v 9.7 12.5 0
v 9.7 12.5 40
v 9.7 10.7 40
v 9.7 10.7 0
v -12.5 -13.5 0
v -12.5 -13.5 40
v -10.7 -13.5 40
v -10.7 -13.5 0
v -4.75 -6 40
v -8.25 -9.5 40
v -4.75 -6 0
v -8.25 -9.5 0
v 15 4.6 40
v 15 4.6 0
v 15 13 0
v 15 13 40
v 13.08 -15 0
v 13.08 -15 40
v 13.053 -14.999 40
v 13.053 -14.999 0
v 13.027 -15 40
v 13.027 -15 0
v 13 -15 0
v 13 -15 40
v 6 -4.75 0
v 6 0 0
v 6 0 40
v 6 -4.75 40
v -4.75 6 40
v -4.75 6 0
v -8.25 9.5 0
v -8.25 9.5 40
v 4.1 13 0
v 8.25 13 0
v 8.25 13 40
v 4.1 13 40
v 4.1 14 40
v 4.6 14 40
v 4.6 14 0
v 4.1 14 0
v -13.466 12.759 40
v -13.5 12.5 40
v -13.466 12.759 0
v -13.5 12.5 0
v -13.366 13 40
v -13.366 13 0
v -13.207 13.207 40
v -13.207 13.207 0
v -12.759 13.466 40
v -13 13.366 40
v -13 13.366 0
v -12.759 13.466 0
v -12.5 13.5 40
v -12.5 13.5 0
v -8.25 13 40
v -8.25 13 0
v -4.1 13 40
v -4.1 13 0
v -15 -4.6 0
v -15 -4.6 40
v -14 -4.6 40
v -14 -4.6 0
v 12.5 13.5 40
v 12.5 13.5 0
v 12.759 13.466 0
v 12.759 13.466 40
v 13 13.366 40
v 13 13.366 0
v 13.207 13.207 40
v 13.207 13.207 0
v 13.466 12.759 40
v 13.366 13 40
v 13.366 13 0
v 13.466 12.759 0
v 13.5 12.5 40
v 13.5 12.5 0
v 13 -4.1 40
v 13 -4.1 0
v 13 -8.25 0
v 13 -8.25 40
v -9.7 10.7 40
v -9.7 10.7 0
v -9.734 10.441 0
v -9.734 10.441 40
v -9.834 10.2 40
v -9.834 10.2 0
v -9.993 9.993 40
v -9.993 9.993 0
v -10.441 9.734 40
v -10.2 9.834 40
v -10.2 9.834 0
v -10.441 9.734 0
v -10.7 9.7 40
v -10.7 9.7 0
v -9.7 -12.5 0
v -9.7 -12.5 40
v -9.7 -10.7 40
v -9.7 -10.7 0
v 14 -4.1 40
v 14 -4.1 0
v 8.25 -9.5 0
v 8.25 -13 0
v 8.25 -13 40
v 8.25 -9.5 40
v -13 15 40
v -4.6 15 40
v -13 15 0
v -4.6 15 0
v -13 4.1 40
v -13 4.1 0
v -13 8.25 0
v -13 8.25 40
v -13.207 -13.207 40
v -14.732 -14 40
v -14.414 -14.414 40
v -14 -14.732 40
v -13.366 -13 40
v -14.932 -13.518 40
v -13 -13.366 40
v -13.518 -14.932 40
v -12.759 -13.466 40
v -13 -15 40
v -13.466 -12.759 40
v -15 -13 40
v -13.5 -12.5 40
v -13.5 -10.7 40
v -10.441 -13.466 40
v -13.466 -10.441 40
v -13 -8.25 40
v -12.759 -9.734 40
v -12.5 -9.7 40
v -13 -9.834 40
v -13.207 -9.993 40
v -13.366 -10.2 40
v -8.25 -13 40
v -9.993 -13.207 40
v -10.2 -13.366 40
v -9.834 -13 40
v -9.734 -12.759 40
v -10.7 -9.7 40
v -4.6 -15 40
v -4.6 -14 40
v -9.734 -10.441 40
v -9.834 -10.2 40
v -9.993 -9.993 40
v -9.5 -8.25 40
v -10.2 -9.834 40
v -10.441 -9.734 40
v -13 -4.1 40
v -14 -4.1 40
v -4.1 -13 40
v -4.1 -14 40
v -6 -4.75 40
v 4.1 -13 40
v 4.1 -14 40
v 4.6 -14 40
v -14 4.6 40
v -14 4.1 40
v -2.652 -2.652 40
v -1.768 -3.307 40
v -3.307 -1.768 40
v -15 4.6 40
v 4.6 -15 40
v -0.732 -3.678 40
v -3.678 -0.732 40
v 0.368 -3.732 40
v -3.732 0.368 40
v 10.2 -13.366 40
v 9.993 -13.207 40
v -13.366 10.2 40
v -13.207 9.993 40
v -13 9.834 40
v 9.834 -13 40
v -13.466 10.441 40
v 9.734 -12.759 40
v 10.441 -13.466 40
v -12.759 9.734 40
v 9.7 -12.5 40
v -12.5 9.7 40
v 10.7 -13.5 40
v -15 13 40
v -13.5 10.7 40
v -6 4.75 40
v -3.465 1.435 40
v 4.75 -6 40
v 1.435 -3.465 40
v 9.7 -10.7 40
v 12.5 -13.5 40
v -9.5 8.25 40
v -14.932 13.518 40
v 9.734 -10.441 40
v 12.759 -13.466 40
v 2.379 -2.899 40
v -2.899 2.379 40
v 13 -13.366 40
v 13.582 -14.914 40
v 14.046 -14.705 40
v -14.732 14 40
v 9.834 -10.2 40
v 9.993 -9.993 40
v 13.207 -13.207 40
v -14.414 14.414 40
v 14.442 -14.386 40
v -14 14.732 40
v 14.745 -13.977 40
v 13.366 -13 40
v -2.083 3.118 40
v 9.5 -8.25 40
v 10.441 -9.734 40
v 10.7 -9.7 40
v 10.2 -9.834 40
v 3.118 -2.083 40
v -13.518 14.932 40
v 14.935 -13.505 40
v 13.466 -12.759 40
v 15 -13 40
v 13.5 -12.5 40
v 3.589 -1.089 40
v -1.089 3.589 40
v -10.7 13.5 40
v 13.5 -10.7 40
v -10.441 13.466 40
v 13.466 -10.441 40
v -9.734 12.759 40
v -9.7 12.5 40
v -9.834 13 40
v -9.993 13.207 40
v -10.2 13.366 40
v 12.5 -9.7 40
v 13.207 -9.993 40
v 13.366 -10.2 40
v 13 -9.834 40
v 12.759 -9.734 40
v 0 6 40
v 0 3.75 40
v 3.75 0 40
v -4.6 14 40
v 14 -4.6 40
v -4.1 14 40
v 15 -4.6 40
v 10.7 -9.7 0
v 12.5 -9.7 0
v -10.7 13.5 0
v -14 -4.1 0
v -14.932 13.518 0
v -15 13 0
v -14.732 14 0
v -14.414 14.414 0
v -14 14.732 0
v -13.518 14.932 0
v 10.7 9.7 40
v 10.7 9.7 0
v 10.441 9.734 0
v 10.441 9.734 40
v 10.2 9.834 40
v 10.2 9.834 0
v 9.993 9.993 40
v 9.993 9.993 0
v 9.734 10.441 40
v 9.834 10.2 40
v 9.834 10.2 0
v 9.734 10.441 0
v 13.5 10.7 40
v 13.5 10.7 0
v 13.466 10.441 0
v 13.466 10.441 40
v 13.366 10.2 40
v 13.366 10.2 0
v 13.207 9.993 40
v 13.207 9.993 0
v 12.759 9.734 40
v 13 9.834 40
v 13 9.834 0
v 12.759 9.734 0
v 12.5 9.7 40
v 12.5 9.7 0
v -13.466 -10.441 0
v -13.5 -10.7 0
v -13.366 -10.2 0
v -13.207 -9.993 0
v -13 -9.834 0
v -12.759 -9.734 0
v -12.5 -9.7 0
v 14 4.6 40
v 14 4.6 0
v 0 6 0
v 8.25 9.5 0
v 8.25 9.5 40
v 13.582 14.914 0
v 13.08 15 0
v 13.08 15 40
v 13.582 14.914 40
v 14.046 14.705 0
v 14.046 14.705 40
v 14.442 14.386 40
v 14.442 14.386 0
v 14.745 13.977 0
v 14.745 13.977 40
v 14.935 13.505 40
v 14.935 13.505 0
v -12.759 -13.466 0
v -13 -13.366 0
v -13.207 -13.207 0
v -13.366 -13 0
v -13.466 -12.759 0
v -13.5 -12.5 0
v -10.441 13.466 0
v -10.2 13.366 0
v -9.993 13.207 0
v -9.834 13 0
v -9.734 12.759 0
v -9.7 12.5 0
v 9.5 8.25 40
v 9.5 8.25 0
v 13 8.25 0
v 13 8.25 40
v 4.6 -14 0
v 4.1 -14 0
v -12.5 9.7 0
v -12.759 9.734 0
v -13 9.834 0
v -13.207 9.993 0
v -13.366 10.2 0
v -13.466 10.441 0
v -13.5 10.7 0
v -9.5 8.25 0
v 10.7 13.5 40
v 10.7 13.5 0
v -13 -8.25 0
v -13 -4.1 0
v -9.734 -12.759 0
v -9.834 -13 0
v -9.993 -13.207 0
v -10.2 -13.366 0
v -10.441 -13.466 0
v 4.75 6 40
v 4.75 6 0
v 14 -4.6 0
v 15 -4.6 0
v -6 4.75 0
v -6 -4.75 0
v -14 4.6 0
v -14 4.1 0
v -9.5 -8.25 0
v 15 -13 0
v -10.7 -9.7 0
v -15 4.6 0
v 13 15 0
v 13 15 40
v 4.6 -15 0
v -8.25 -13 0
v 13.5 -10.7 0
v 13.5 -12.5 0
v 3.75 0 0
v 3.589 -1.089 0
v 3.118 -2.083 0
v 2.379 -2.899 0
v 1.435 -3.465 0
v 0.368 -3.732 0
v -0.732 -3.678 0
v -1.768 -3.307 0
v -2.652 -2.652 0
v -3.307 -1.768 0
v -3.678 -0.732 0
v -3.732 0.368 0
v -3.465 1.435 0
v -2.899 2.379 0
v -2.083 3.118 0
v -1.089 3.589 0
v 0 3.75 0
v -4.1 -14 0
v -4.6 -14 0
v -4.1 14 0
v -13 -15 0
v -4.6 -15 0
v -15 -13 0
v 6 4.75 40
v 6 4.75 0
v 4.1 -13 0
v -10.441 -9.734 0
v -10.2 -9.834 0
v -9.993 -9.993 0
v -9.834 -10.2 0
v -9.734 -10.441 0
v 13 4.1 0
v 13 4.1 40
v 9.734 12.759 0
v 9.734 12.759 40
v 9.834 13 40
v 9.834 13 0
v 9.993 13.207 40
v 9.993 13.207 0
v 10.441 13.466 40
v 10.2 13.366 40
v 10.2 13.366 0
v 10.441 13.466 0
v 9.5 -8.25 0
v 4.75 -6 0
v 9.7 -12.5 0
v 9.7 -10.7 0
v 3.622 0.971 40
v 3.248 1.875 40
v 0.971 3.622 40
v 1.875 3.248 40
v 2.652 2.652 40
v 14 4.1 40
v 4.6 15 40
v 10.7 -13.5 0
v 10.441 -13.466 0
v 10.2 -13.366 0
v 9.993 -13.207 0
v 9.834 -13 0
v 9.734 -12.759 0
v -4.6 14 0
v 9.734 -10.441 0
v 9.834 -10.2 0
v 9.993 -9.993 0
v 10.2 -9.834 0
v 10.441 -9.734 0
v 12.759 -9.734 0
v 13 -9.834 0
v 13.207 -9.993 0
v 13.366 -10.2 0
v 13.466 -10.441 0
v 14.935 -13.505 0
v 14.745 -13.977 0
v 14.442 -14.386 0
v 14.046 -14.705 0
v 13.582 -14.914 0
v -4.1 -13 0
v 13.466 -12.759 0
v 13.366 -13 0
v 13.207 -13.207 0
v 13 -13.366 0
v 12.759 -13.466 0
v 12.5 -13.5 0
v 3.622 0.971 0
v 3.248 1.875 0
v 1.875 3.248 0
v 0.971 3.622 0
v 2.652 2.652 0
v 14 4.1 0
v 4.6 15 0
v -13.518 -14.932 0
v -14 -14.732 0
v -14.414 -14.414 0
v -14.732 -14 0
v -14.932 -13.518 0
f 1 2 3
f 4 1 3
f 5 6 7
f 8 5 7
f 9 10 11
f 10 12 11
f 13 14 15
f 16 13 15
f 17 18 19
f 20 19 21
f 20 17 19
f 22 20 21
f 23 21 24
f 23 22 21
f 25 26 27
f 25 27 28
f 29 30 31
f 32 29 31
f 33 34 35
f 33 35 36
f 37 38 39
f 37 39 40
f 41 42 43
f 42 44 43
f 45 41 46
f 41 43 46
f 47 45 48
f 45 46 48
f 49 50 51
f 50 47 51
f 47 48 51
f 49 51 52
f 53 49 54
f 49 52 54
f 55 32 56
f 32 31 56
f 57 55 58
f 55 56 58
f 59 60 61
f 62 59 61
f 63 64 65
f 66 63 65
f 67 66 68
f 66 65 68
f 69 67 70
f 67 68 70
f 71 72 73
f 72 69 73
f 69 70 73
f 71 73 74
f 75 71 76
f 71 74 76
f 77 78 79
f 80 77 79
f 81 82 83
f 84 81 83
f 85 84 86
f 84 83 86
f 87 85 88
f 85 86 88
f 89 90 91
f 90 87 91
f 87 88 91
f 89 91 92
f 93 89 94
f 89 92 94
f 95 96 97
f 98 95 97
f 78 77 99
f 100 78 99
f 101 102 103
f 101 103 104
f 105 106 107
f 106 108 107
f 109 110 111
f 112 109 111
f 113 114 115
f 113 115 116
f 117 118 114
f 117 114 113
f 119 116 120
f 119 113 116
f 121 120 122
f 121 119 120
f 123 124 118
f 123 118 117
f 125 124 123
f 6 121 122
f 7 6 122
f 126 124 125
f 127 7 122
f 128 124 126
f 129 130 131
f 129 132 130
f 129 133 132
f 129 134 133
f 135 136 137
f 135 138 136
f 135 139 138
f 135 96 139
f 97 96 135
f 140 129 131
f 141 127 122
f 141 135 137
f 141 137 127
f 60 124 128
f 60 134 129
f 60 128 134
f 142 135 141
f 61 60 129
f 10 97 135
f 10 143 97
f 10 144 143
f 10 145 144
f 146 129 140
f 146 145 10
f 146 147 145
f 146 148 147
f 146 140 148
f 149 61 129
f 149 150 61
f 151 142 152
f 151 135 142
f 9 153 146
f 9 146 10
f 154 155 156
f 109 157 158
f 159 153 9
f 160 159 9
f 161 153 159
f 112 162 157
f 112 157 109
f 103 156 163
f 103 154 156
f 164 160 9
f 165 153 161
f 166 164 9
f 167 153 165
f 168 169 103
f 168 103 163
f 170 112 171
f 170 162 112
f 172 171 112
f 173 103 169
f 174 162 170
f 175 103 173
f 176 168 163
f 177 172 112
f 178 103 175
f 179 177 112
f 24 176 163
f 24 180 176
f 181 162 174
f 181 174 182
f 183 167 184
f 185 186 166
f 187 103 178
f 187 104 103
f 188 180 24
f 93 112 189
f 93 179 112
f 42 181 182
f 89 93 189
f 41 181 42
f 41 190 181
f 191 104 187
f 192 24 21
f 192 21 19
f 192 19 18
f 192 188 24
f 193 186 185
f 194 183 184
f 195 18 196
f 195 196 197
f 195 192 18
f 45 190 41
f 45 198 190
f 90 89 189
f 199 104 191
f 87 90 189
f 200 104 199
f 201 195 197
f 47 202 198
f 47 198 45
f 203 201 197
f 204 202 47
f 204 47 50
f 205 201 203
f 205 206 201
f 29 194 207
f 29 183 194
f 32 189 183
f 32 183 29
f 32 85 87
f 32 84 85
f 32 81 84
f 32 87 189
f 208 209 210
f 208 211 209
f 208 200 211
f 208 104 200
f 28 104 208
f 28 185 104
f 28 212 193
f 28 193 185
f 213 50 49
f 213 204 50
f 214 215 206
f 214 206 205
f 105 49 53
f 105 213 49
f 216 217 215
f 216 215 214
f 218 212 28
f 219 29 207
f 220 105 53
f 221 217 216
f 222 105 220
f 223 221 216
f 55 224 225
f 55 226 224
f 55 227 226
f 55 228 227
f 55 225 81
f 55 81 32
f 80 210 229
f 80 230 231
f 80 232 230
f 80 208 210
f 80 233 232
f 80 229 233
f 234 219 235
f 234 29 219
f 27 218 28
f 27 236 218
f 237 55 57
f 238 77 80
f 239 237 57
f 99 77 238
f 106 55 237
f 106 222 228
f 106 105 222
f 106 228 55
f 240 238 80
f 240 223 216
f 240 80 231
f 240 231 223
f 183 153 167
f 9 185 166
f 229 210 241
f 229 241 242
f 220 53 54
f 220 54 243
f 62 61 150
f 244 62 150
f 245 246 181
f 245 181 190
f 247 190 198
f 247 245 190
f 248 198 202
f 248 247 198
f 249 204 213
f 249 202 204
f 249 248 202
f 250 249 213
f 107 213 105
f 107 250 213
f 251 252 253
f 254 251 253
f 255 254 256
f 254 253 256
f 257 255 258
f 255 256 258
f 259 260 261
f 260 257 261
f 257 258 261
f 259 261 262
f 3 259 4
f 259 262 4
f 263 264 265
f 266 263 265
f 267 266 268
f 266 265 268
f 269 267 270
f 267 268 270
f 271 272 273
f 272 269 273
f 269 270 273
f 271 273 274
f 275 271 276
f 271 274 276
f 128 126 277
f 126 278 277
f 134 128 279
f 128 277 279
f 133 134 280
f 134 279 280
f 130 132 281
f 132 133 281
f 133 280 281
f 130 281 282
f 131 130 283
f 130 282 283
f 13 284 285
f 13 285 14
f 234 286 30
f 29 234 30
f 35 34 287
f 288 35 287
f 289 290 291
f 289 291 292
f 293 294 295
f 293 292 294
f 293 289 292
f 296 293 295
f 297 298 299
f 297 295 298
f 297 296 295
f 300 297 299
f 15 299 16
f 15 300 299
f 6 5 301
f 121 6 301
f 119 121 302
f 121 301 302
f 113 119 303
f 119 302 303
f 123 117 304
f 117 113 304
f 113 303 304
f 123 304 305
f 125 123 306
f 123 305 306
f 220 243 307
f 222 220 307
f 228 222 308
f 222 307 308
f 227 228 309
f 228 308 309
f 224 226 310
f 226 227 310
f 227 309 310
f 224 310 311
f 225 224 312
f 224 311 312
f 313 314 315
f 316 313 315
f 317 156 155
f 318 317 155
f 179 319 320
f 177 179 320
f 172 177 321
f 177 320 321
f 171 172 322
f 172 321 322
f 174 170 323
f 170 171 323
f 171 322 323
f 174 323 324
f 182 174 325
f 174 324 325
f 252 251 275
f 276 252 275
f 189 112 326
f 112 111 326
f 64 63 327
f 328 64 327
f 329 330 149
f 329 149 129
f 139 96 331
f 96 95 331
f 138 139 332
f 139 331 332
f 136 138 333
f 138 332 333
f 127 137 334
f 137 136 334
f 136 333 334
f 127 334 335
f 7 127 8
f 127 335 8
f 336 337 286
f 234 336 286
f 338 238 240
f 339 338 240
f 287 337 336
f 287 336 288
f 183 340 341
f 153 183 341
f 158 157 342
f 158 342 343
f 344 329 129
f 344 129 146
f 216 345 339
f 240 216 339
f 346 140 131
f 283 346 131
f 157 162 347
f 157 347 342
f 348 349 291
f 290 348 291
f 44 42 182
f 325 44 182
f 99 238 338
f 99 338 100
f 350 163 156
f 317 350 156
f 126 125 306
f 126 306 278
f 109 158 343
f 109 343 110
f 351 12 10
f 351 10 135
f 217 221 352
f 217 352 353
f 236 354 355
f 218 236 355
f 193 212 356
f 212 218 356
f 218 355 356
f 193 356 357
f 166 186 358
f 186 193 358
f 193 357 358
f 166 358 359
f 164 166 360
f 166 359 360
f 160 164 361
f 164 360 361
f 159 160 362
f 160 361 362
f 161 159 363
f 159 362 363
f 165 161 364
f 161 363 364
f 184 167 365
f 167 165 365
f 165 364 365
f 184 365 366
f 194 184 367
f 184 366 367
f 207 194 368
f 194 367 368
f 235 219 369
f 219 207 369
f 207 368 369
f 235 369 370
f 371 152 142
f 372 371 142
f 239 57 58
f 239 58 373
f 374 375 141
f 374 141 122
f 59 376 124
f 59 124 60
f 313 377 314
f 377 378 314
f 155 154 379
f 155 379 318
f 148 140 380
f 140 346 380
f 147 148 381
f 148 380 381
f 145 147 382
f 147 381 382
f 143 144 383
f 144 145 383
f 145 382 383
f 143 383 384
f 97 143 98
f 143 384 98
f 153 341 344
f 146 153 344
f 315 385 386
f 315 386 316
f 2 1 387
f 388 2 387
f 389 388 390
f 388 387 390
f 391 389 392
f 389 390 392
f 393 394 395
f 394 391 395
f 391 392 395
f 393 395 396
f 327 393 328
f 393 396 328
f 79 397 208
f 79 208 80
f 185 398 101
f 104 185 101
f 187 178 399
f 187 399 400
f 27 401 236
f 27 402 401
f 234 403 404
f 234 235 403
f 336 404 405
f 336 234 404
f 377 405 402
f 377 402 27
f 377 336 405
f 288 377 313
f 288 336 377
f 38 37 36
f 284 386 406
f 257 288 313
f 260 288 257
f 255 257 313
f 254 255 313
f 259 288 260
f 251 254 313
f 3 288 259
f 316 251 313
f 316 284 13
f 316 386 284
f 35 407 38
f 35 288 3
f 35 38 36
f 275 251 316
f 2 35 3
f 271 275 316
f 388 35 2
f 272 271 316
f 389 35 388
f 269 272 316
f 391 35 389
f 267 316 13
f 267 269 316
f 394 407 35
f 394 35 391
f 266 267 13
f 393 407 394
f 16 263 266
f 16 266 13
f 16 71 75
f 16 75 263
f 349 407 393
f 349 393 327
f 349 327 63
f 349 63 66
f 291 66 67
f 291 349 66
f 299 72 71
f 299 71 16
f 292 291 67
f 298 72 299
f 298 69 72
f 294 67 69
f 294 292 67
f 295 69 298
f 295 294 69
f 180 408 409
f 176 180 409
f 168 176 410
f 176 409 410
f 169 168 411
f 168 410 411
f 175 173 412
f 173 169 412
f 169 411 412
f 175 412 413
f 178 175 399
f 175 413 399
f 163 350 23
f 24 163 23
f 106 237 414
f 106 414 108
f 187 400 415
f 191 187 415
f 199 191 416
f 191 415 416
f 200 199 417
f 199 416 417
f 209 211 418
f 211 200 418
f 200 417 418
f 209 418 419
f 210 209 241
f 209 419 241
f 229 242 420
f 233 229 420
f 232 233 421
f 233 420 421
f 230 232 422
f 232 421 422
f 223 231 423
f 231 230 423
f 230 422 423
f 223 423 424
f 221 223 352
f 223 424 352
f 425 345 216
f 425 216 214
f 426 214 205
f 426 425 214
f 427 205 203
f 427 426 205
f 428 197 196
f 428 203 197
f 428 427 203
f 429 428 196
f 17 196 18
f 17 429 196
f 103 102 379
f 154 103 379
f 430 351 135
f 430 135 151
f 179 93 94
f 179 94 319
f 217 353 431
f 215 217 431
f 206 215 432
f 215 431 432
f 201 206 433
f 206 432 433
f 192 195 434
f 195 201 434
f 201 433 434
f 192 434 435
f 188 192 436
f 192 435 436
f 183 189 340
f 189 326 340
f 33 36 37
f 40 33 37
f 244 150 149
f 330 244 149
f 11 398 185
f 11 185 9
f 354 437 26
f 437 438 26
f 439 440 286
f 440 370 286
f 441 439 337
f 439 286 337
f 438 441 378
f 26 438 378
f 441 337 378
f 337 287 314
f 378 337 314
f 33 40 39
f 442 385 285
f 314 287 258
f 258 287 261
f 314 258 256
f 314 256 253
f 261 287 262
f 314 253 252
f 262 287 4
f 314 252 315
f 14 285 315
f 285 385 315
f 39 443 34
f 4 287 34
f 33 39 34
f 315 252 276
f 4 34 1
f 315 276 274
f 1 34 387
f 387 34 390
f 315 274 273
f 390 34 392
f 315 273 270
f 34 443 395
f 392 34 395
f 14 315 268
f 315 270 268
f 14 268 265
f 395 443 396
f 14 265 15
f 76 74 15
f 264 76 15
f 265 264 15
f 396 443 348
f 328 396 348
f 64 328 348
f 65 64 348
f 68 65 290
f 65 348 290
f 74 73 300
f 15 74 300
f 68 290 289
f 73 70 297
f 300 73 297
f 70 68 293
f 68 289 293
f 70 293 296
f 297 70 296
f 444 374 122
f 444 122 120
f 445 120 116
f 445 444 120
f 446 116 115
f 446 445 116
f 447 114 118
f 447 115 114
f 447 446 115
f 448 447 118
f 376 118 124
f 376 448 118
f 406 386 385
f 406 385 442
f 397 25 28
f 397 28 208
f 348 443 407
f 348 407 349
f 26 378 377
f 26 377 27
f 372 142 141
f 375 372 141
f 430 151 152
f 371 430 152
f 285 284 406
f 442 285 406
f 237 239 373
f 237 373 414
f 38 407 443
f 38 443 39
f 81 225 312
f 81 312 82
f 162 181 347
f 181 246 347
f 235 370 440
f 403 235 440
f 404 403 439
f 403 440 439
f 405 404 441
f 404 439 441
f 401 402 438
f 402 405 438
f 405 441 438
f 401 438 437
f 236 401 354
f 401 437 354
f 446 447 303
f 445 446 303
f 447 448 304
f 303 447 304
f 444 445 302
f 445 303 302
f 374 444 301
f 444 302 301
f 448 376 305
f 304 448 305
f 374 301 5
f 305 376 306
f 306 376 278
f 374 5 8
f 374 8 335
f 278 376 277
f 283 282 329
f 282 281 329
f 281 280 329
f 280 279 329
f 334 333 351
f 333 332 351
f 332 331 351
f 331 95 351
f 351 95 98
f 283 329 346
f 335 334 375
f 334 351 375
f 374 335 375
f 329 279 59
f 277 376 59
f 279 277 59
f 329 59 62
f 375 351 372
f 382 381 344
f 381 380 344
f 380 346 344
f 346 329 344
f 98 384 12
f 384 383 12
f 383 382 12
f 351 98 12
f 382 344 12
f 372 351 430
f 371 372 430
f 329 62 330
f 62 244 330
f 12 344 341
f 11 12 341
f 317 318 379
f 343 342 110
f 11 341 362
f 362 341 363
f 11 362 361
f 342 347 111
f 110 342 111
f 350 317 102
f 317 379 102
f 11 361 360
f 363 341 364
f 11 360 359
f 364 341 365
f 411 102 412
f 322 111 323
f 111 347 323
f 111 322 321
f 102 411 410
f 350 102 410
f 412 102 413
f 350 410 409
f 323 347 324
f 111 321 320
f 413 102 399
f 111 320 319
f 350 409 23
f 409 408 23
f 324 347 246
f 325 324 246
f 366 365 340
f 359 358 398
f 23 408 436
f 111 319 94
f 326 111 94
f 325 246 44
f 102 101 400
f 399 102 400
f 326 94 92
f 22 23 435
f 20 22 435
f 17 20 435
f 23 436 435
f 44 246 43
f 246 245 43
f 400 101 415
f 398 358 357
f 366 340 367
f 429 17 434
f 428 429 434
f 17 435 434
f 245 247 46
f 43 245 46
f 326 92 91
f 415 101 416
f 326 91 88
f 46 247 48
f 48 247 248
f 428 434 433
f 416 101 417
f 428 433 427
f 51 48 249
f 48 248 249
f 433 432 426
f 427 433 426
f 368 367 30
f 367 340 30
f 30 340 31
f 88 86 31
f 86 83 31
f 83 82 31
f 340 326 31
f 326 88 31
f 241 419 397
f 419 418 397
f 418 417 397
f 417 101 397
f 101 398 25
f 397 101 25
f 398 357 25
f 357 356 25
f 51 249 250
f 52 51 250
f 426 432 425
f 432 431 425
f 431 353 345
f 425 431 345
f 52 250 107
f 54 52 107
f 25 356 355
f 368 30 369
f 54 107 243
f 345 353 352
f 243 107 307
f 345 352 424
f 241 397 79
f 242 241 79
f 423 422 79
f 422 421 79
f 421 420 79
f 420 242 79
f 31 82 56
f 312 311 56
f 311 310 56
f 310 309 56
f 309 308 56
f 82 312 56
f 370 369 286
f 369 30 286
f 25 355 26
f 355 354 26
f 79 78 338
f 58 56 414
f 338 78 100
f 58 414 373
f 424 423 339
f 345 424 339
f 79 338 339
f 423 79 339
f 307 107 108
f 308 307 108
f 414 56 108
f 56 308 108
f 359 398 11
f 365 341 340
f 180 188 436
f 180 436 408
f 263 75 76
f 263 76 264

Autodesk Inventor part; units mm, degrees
ref_plane "YZ Plane" through (0, 0, 0) normal (1, 0, 0) x (0, 1, 0)
ref_plane "XZ Plane" through (0, 0, 0) normal (0, 1, 0) x (-1, 0, 0)
ref_plane "XY Plane" through (0, 0, 0) normal (0, 0, 1) x (1, 0, 0)
sketch "Sketch1" plane through (0, 0, 0) normal (0, 0, 1) x (1, 0, 0)
  line L0 (-4.1, 13) -> (-4.1, 14)
  line L1 (-4.1, 14) -> (-4.6, 14)
  line L2 (-4.6, 14) -> (-4.6, 15)
  line L3 (-4.6, 14) -> (-4.6, 15)
  line L4 (-4.6, 15) -> (-13, 15)
  arc A0 (-13, 15) -> (-15, 13) centre (-13, 13) ccw
  line L5 (-15, 13) -> (-15, 4.6)
  line L6 (-15, 13) -> (-15, 4.6)
  line L7 (-15, 4.6) -> (-14, 4.6)
  line L8 (-15, 4.6) -> (-14, 4.6)
  line L9 (-14, 4.6) -> (-14, 4.1)
  line L10 (-14, 4.6) -> (-14, 4.1)
  line L11 (-14, 4.1) -> (-13, 4.1)
  line L12 (-13, 4.1) -> (-13, 8.25)
  line L13 (-13, 8.25) -> (-9.5, 8.25)
  line L14 (-13, 8.25) -> (-9.5, 8.25)
  line L15 (-9.5, 8.25) -> (-6, 4.75)
  line L16 (-6, 4.75) -> (-6, -4.75)
  line L17 (-6, 4.75) -> (-6, -4.75)
  line L18 (-6, -4.75) -> (-9.5, -8.25)
  line L19 (-14, -4.1) -> (-13, -4.1)
  line L20 (-13, -4.1) -> (-14, -4.1)
  line L21 (-14, -4.6) -> (-14, -4.1)
  line L22 (-14, -4.1) -> (-14, -4.6)
  line L23 (-15, -4.6) -> (-14, -4.6)
  line L24 (-14, -4.6) -> (-15, -4.6)
  line L25 (-8.25, 13) -> (-4.1, 13)
  line L26 (-4.1, 13) -> (-8.25, 13)
  line L27 (-8.25, 9.5) -> (-8.25, 13)
  line L28 (-8.25, 13) -> (-8.25, 9.5)
  line L29 (-4.75, 6) -> (-8.25, 9.5)
  line L30 (-8.25, 9.5) -> (-4.75, 6)
  line L31 (4.75, 6) -> (-4.75, 6)
  line L32 (-4.75, 6) -> (4.75, 6)
  line L33 (4.75, 6) -> (8.25, 9.5)
  line L34 (8.25, 13) -> (8.25, 9.5)
  line L35 (8.25, 9.5) -> (8.25, 13)
  line L36 (8.25, 13) -> (4.1, 13)
  line L37 (4.1, 13) -> (4.1, 14)
  line L38 (4.6, 14) -> (4.1, 14)
  line L39 (4.1, 14) -> (4.6, 14)
  line L40 (4.6, 15) -> (4.6, 14)
  line L41 (4.6, 14) -> (4.6, 15)
  line L42 (4.6, 15) -> (13.08, 15)
  line L43 (15, 4.6) -> (15, 13)
  line L44 (15, 13) -> (15, 4.6)
  line L45 (14, 4.6) -> (15, 4.6)
  line L46 (15, 4.6) -> (14, 4.6)
  line L47 (14, 4.6) -> (14, 4.1)
  line L48 (13, 4.1) -> (14, 4.1)
  line L49 (14, 4.1) -> (13, 4.1)
  line L50 (13, 4.1) -> (13, 8.25)
  line L51 (9.5, 8.25) -> (13, 8.25)
  line L52 (13, 8.25) -> (9.5, 8.25)
  line L53 (6, 4.75) -> (9.5, 8.25)
  line L54 (9.5, 8.25) -> (6, 4.75)
  line L55 (6, 4.75) -> (6, -4.75)
  circle A1 centre (0, 0) radius 3.75
  line L56 (0, 0) -> (7.2487, 0)
  arc A2 (15, 13) -> (13, 15) centre (13, 13) ccw
  arc A3 (15, 13) -> (13.08, 15) centre (12.9977, 12.9994) ccw
  line L57 (-9.5, -8.25) -> (-6, -4.75)
  line L58 (-8.25, -9.5) -> (-4.75, -6)
  line L59 (-4.75, -6) -> (-8.25, -9.5)
  line L60 (-4.1, -13) -> (-4.1, -14)
  line L61 (-4.1, -14) -> (-4.6, -14)
  line L62 (-8.25, -13) -> (-4.1, -13)
  line L63 (-4.1, -13) -> (-8.25, -13)
  line L64 (-8.25, -9.5) -> (-8.25, -13)
  line L65 (-8.25, -13) -> (-8.25, -9.5)
  line L66 (-13, -8.25) -> (-9.5, -8.25)
  line L67 (-13, -4.1) -> (-13, -8.25)
  line L68 (-4.6, -14) -> (-4.6, -15)
  line L69 (-4.6, -14) -> (-4.6, -15)
  line L70 (-4.6, -15) -> (-13, -15)
  line L71 (-14, -4.6) -> (-14, -4.1)
  line L72 (-14, -4.6) -> (-14, -4.1)
  line L73 (-14, -4.1) -> (-13, -4.1)
  line L74 (-15, -4.6) -> (-14, -4.6)
  line L75 (-15, -4.6) -> (-14, -4.6)
  line L76 (-15, -13) -> (-15, -4.6)
  line L77 (-15, -13) -> (-15, -4.6)
  arc A4 (-15, -13) -> (-13, -15) centre (-13, -13) ccw
  line L78 (-13, -8.25) -> (-9.5, -8.25)
  line L79 (8.25, -13) -> (8.25, -9.5)
  line L80 (8.25, -9.5) -> (8.25, -13)
  line L81 (9.5, -8.25) -> (13, -8.25)
  line L82 (13, -8.25) -> (9.5, -8.25)
  line L83 (15, -13) -> (15, -4.6)
  line L84 (15, -4.6) -> (15, -13)
  line L85 (13, -4.1) -> (13, -8.25)
  line L86 (13, -4.1) -> (14, -4.1)
  line L87 (14, -4.1) -> (13, -4.1)
  line L88 (14, -4.6) -> (14, -4.1)
  line L89 (14, -4.6) -> (15, -4.6)
  line L90 (15, -4.6) -> (14, -4.6)
  line L91 (4.75, -6) -> (8.25, -9.5)
  line L92 (6, -4.75) -> (9.5, -8.25)
  line L93 (9.5, -8.25) -> (6, -4.75)
  arc A5 (13, -15) -> (15, -13) centre (13, -13) ccw
  arc A6 (13.08, -15) -> (15, -13) centre (12.9977, -12.9994) ccw
  line L94 (8.25, -13) -> (4.1, -13)
  line L95 (4.1, -13) -> (4.1, -14)
  line L96 (4.6, -14) -> (4.1, -14)
  line L97 (4.1, -14) -> (4.6, -14)
  line L98 (4.6, -15) -> (4.6, -14)
  line L99 (4.6, -14) -> (4.6, -15)
  line L100 (4.6, -15) -> (13.08, -15)
  line L101 (4.75, -6) -> (-4.75, -6)
  line L102 (-4.75, -6) -> (4.75, -6)
  circle A7 centre (0, 0) radius 3.75
  line L103 (-12.5, 13.5) -> (-10.7, 13.5)
  line L104 (-12.5, 13.5) -> (-10.7, 13.5)
  line L105 (-9.7, 12.5) -> (-9.7, 10.7)
  line L106 (-9.7, 12.5) -> (-9.7, 10.7)
  line L107 (-10.7, 9.7) -> (-12.5, 9.7)
  line L108 (-10.7, 9.7) -> (-12.5, 9.7)
  line L109 (-13.5, 12.5) -> (-13.5, 10.7)
  line L110 (-13.5, 10.7) -> (-13.5, 12.5)
  line L111 (-13.5, 12.5) -> (-13.5, 10.7)
  arc A8 (-12.5, 13.5) -> (-13.5, 12.5) centre (-12.5, 12.5) ccw
  arc A9 (-13.5, 10.7) -> (-12.5, 9.7) centre (-12.5, 10.7) ccw
  arc A10 (-13.5, 10.7) -> (-12.5, 9.7) centre (-12.5, 10.7) ccw
  arc A11 (-10.7, 9.7) -> (-9.7, 10.7) centre (-10.7, 10.7) ccw
  arc A12 (-9.7, 12.5) -> (-10.7, 13.5) centre (-10.7, 12.5) ccw
  arc A13 (-9.7, 12.5) -> (-10.7, 13.5) centre (-10.7, 12.5) ccw
  line L112 (0, 0) -> (0, 6.5)
  arc A14 (9.7, 10.7) -> (10.7, 9.7) centre (10.7, 10.7) ccw
  line L113 (9.7, 12.5) -> (9.7, 10.7)
  arc A15 (10.7, 13.5) -> (9.7, 12.5) centre (10.7, 12.5) ccw
  arc A16 (10.7, 13.5) -> (9.7, 12.5) centre (10.7, 12.5) ccw
  line L114 (9.7, 12.5) -> (9.7, 10.7)
  line L115 (12.5, 13.5) -> (10.7, 13.5)
  line L116 (12.5, 13.5) -> (10.7, 13.5)
  line L117 (10.7, 9.7) -> (12.5, 9.7)
  line L118 (10.7, 9.7) -> (12.5, 9.7)
  arc A17 (12.5, 9.7) -> (13.5, 10.7) centre (12.5, 10.7) ccw
  arc A18 (12.5, 9.7) -> (13.5, 10.7) centre (12.5, 10.7) ccw
  line L119 (13.5, 12.5) -> (13.5, 10.7)
  line L120 (13.5, 10.7) -> (13.5, 12.5)
  line L121 (13.5, 12.5) -> (13.5, 10.7)
  arc A19 (13.5, 12.5) -> (12.5, 13.5) centre (12.5, 12.5) ccw
  arc A20 (-13.5, -12.5) -> (-12.5, -13.5) centre (-12.5, -12.5) ccw
  line L122 (-9.7, -12.5) -> (-9.7, -10.7)
  line L123 (-9.7, -12.5) -> (-9.7, -10.7)
  line L124 (-10.7, -9.7) -> (-12.5, -9.7)
  line L125 (-10.7, -9.7) -> (-12.5, -9.7)
  line L126 (-13.5, -12.5) -> (-13.5, -10.7)
  line L127 (-13.5, -10.7) -> (-13.5, -12.5)
  line L128 (-13.5, -12.5) -> (-13.5, -10.7)
  arc A21 (-12.5, -9.7) -> (-13.5, -10.7) centre (-12.5, -10.7) ccw
  arc A22 (-12.5, -9.7) -> (-13.5, -10.7) centre (-12.5, -10.7) ccw
  arc A23 (-9.7, -10.7) -> (-10.7, -9.7) centre (-10.7, -10.7) ccw
  line L129 (-12.5, -13.5) -> (-10.7, -13.5)
  line L130 (-12.5, -13.5) -> (-10.7, -13.5)
  arc A24 (-10.7, -13.5) -> (-9.7, -12.5) centre (-10.7, -12.5) ccw
  arc A25 (-10.7, -13.5) -> (-9.7, -12.5) centre (-10.7, -12.5) ccw
  line L131 (12.5, -13.5) -> (10.7, -13.5)
  line L132 (12.5, -13.5) -> (10.7, -13.5)
  line L133 (9.7, -12.5) -> (9.7, -10.7)
  line L134 (9.7, -12.5) -> (9.7, -10.7)
  arc A26 (9.7, -12.5) -> (10.7, -13.5) centre (10.7, -12.5) ccw
  arc A27 (9.7, -12.5) -> (10.7, -13.5) centre (10.7, -12.5) ccw
  line L135 (13.5, -10.7) -> (13.5, -12.5)
  line L136 (13.5, -12.5) -> (13.5, -10.7)
  line L137 (13.5, -12.5) -> (13.5, -10.7)
  arc A28 (12.5, -13.5) -> (13.5, -12.5) centre (12.5, -12.5) ccw
  arc A29 (13.5, -10.7) -> (12.5, -9.7) centre (12.5, -10.7) ccw
  arc A30 (13.5, -10.7) -> (12.5, -9.7) centre (12.5, -10.7) ccw
  arc A31 (10.7, -9.7) -> (9.7, -10.7) centre (10.7, -10.7) ccw
  line L138 (10.7, -9.7) -> (12.5, -9.7)
  line L139 (10.7, -9.7) -> (12.5, -9.7)
  point P0 (14.7321, -14)
  point P1 (14.7321, 14)
  point P2 (14.7321, 14)
  point P3 (14.7321, -14)
extrude "Extrusion1" add sketch "Sketch1" along normal blind 40 contours L25 L27 L29 L31 L112 A1 L56 L55 L92 L81 L85 L86 L88 L89 L83 A5 L100 L98 L96 L95 L94 L79 L91 L101 L58 L64 L62 L60 L61 L68 L70 A4 L76 L23 L21 L19 L67 L66 L18 L16 L15 L13 L12 L11 L9 L7 L5 A0 L4 L2 L1 L0 | L31 L33 L34 L36 L37 L38 L40 L42 A2 L43 L45 L47 L48 L50 L51 L53 L55 L56 A1 L112
properties part number "30x30 aluminum" material "Aluminum 6061"
